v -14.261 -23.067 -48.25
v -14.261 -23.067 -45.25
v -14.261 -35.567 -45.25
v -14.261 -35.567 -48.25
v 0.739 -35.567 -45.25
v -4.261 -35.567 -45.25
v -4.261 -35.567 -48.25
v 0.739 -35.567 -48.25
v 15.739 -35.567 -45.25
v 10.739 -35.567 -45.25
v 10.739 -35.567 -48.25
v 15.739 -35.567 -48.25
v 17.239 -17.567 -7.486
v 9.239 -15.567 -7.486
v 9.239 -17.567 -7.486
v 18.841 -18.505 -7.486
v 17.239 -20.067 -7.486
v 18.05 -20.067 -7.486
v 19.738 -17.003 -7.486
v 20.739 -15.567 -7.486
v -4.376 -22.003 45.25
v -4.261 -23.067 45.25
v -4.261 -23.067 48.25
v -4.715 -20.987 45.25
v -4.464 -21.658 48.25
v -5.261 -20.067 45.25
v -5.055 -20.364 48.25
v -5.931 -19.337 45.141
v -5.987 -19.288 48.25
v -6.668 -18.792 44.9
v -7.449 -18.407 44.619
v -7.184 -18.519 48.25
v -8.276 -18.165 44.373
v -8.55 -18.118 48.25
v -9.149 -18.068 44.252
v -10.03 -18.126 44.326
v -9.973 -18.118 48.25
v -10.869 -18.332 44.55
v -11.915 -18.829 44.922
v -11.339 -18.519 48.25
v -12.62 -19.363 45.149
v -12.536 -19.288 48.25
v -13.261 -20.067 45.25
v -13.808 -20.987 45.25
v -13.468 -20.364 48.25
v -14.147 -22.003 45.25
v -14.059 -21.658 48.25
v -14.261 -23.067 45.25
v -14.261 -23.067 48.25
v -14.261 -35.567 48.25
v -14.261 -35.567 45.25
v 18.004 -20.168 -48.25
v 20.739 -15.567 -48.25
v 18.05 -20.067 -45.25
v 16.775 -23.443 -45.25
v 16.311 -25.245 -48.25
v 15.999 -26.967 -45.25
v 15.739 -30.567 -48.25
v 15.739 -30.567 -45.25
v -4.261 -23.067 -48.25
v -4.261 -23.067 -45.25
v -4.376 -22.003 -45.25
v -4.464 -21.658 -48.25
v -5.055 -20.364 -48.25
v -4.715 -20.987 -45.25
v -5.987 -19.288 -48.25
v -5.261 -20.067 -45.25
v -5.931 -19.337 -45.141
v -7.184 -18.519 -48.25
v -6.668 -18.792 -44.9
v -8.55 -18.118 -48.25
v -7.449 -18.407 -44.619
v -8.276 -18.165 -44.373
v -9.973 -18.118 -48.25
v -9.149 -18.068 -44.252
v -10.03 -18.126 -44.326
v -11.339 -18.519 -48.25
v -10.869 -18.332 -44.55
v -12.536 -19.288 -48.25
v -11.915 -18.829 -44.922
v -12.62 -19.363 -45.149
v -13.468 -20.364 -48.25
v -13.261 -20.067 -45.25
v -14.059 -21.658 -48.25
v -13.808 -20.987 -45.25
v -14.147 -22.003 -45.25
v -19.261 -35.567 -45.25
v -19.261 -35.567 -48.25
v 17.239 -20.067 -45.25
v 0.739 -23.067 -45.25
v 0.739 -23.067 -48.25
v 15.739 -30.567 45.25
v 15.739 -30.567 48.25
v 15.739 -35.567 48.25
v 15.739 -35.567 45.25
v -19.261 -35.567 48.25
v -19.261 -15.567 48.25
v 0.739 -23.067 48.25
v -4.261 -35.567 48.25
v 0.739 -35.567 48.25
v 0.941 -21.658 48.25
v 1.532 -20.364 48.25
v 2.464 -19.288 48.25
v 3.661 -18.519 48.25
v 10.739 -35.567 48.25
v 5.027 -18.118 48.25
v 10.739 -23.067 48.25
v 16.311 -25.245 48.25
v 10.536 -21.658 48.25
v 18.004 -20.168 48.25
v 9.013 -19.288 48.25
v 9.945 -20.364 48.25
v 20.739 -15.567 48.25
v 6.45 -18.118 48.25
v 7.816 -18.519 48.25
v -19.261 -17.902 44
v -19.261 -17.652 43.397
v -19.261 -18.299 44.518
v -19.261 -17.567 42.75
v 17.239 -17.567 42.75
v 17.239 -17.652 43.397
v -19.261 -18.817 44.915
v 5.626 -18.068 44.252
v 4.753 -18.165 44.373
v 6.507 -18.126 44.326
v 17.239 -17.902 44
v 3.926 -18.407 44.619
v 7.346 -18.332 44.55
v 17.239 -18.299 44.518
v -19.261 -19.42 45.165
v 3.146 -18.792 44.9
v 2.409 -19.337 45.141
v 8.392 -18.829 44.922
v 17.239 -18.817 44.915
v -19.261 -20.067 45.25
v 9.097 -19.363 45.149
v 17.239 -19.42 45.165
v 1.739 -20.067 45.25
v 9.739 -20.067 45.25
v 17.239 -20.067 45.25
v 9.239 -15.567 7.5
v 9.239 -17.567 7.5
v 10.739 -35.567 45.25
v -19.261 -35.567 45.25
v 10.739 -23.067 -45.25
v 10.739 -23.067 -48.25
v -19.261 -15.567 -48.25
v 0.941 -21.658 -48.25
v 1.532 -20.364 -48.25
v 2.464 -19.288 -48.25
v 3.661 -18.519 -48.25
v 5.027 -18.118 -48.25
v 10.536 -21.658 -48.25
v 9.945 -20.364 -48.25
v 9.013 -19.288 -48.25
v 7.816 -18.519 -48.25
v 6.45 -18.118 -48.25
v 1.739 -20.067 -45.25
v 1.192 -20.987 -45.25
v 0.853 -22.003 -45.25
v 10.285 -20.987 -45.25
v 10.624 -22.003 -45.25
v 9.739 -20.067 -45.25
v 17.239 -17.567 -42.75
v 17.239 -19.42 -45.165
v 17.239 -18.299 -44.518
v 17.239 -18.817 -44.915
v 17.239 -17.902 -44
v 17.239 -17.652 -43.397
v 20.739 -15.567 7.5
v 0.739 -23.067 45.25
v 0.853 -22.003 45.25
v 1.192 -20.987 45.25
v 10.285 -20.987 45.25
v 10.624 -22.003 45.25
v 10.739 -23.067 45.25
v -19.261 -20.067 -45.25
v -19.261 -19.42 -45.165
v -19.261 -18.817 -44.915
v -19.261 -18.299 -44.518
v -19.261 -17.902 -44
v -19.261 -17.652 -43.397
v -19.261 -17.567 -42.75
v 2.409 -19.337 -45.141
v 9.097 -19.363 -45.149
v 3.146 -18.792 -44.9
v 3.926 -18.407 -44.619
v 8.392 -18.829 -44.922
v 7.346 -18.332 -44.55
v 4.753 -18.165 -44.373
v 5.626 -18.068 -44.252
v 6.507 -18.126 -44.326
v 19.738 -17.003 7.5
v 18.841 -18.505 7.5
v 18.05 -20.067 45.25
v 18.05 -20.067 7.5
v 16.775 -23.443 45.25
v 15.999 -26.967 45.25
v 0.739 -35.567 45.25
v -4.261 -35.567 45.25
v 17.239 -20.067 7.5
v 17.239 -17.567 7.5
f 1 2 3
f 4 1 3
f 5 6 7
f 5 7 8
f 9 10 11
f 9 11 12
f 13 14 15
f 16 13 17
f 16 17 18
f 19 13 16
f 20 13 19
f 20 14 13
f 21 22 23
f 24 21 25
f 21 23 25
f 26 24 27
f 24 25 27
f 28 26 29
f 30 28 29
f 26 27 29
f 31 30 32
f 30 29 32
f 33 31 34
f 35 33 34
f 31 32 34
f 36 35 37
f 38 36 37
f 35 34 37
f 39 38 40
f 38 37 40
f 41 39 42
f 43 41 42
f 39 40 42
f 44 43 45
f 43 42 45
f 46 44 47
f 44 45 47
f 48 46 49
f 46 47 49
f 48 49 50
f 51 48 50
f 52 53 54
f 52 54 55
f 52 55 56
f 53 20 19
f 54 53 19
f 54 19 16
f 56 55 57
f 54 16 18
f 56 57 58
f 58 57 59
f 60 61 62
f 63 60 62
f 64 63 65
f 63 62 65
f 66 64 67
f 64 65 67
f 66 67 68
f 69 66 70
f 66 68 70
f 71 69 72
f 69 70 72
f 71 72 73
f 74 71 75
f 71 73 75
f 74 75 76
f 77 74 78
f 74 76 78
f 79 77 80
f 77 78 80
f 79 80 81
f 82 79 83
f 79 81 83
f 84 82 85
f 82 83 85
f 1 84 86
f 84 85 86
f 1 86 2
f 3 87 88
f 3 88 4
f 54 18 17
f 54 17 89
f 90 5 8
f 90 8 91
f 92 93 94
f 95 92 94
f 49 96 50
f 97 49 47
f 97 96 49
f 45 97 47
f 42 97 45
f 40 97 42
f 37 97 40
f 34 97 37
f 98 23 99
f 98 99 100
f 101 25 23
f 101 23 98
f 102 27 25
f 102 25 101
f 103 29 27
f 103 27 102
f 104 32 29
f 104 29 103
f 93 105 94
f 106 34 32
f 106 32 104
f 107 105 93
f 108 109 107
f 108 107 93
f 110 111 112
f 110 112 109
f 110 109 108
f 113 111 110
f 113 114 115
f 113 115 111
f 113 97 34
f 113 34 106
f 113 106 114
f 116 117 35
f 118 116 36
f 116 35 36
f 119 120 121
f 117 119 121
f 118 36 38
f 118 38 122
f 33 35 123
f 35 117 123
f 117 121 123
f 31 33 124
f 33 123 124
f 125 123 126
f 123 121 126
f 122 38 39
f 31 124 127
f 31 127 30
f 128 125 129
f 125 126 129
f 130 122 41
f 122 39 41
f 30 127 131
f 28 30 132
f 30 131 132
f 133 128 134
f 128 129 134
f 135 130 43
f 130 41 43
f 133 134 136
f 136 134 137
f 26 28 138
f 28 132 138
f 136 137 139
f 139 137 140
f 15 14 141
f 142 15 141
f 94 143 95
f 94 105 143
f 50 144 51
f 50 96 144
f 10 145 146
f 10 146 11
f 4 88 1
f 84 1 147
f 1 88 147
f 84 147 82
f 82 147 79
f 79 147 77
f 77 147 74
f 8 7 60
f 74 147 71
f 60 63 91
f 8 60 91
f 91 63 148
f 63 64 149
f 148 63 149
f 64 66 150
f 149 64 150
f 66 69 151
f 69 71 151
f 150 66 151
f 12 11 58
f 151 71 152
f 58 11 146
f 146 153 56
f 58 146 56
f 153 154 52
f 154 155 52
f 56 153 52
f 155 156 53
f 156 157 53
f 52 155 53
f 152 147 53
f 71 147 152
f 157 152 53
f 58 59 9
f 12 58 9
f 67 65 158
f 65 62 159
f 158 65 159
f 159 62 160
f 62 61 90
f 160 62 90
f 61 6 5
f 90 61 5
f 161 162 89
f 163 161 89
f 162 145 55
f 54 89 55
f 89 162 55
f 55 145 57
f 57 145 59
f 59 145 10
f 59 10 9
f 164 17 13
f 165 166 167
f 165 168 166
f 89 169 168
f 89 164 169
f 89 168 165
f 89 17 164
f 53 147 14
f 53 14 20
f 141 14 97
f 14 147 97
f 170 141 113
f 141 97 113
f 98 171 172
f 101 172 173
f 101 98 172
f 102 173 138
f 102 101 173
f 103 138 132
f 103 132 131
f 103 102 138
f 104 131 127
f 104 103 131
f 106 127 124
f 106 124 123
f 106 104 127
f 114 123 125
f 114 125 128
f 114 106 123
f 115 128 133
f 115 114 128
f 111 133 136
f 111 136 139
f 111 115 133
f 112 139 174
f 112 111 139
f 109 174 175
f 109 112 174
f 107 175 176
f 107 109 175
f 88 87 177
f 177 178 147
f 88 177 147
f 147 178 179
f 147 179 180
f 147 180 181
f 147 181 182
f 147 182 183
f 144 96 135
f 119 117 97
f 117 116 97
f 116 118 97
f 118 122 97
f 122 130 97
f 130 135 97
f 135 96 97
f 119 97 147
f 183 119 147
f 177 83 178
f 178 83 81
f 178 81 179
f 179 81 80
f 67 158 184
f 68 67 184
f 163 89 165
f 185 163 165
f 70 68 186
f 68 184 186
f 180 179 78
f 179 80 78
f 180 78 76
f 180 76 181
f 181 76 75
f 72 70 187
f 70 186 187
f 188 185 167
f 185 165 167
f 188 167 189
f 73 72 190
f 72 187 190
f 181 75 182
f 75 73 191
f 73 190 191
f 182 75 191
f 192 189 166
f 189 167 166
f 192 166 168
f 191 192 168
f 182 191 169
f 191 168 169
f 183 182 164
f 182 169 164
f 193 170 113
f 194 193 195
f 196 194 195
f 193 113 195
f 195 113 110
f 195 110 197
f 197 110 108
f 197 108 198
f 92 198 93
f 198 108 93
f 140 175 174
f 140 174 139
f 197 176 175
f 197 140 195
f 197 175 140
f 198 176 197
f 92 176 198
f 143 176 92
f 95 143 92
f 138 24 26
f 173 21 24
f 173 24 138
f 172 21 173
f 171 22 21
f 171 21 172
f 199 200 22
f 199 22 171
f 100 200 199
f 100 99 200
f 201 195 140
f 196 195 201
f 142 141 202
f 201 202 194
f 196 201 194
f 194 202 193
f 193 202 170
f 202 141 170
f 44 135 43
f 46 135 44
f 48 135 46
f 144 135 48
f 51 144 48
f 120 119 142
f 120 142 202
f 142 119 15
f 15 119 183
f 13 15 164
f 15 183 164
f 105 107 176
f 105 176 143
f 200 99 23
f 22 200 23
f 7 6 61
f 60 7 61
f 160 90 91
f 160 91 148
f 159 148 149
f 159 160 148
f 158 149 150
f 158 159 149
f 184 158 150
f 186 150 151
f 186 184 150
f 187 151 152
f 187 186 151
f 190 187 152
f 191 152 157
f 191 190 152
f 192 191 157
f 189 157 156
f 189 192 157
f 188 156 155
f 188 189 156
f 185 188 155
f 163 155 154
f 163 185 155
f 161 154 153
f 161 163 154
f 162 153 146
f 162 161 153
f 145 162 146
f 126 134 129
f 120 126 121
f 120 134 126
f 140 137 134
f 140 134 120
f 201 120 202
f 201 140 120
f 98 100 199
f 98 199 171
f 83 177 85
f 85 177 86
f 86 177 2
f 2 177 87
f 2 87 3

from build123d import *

# Parameters (mm, degrees)
SKETCH8_W           = 40
SKETCH8_H           = 20
BOSS_EXTRUDE1_DEPTH = 48.25
SKETCH10_W          = 36.5
SKETCH10_H          = 90.5
CUT_EXTRUDE6_DEPTH  = 18
SKETCH12_W          = 90.5
SKETCH12_H          = 15.5
CUT_EXTRUDE9_DEPTH  = 28
CUT_EXTRUDE10_DEPTH = 97.5
SKETCH14_W          = 13
SKETCH14_H          = 14.985683259
CUT_EXTRUDE11_DEPTH = 10
FILLET6_R           = 2.5
CUT_EXTRUDE12_DEPTH = 97.5


with BuildPart() as part:
    # Sketch8 → Boss-Extrude1 (new body, symmetric)
    with BuildSketch(Plane.XY):
        with Locations((0.738550377, -25.566858374)):
            Rectangle(SKETCH8_W, SKETCH8_H)
    extrude(amount=BOSS_EXTRUDE1_DEPTH, both=True)

    # Sketch10 → Cut-Extrude6 (cut)
    with BuildSketch(Plane(origin=(0, -35.566858374, 0), x_dir=(1, 0, 0), z_dir=(0, 1, 0))):
        with Locations((-1.011449623, 0)):
            Rectangle(SKETCH10_W, SKETCH10_H)
    extrude(amount=CUT_EXTRUDE6_DEPTH, mode=Mode.SUBTRACT)

    # Sketch12 → Cut-Extrude9 (cut)
    with BuildSketch(Plane(origin=(20.738550377, 0, 0), x_dir=(0, 0, -1), z_dir=(1, 0, 0))):
        with Locations((0, -27.816858374)):
            Rectangle(SKETCH12_W, SKETCH12_H)
    extrude(amount=-CUT_EXTRUDE9_DEPTH, mode=Mode.SUBTRACT)

    # Sketch13 → Cut-Extrude10 (cut, through all)
    with BuildSketch(Plane.XY.offset(48.25)):
        with BuildLine():
            Line((15.738550377, -35.566858374), (20.738550377, -35.566858374))
            Line((20.738550377, -35.566858374), (20.738550377, -15.566858374))
            ThreePointArc((20.738550377, -15.566858374), (17.021467925, -22.661164224), (15.738550377, -30.566858374))
            Line((15.738550377, -30.566858374), (15.738550377, -35.566858374))
        make_face()
    extrude(amount=-CUT_EXTRUDE10_DEPTH, mode=Mode.SUBTRACT)

    # Sketch14 → Cut-Extrude11 (cut)
    with BuildSketch(Plane.XZ.offset(15.566858374)):
        with Locations((15.738550377, 0.007158371)):
            Rectangle(SKETCH14_W, SKETCH14_H)
    extrude(amount=CUT_EXTRUDE11_DEPTH, mode=Mode.SUBTRACT)

    # Fillet6
    fillet6_edges = [part.edges().sort_by_distance(p)[0] for p in [
        (-1.011449623, -17.566858374, 45.25),
        (-1.011449623, -17.566858374, -45.25),
    ]]
    fillet(fillet6_edges, radius=FILLET6_R)

    # Sketch15 → Cut-Extrude12 (cut, through all)
    with BuildSketch(Plane.XY.offset(48.25)):
        with BuildLine():
            Line((-14.261449623, -35.566858374), (-4.261449623, -35.566858374))
            Line((-4.261449623, -35.566858374), (-4.261449623, -23.066858374))
            ThreePointArc((-4.261449623, -23.066858374), (-9.261449623, -18.066858374), (-14.261449623, -23.066858374))
            Line((-14.261449623, -23.066858374), (-14.261449623, -35.566858374))
        make_face()
        with BuildLine():
            Line((10.738550377, -35.566858374), (0.738550377, -35.566858374))
            Line((0.738550377, -35.566858374), (0.738550377, -23.066858374))
            ThreePointArc((0.738550377, -23.066858374), (5.738550377, -18.066858374), (10.738550377, -23.066858374))
            Line((10.738550377, -23.066858374), (10.738550377, -35.566858374))
        make_face()
    extrude(amount=-CUT_EXTRUDE12_DEPTH, mode=Mode.SUBTRACT)


solid = part.part
